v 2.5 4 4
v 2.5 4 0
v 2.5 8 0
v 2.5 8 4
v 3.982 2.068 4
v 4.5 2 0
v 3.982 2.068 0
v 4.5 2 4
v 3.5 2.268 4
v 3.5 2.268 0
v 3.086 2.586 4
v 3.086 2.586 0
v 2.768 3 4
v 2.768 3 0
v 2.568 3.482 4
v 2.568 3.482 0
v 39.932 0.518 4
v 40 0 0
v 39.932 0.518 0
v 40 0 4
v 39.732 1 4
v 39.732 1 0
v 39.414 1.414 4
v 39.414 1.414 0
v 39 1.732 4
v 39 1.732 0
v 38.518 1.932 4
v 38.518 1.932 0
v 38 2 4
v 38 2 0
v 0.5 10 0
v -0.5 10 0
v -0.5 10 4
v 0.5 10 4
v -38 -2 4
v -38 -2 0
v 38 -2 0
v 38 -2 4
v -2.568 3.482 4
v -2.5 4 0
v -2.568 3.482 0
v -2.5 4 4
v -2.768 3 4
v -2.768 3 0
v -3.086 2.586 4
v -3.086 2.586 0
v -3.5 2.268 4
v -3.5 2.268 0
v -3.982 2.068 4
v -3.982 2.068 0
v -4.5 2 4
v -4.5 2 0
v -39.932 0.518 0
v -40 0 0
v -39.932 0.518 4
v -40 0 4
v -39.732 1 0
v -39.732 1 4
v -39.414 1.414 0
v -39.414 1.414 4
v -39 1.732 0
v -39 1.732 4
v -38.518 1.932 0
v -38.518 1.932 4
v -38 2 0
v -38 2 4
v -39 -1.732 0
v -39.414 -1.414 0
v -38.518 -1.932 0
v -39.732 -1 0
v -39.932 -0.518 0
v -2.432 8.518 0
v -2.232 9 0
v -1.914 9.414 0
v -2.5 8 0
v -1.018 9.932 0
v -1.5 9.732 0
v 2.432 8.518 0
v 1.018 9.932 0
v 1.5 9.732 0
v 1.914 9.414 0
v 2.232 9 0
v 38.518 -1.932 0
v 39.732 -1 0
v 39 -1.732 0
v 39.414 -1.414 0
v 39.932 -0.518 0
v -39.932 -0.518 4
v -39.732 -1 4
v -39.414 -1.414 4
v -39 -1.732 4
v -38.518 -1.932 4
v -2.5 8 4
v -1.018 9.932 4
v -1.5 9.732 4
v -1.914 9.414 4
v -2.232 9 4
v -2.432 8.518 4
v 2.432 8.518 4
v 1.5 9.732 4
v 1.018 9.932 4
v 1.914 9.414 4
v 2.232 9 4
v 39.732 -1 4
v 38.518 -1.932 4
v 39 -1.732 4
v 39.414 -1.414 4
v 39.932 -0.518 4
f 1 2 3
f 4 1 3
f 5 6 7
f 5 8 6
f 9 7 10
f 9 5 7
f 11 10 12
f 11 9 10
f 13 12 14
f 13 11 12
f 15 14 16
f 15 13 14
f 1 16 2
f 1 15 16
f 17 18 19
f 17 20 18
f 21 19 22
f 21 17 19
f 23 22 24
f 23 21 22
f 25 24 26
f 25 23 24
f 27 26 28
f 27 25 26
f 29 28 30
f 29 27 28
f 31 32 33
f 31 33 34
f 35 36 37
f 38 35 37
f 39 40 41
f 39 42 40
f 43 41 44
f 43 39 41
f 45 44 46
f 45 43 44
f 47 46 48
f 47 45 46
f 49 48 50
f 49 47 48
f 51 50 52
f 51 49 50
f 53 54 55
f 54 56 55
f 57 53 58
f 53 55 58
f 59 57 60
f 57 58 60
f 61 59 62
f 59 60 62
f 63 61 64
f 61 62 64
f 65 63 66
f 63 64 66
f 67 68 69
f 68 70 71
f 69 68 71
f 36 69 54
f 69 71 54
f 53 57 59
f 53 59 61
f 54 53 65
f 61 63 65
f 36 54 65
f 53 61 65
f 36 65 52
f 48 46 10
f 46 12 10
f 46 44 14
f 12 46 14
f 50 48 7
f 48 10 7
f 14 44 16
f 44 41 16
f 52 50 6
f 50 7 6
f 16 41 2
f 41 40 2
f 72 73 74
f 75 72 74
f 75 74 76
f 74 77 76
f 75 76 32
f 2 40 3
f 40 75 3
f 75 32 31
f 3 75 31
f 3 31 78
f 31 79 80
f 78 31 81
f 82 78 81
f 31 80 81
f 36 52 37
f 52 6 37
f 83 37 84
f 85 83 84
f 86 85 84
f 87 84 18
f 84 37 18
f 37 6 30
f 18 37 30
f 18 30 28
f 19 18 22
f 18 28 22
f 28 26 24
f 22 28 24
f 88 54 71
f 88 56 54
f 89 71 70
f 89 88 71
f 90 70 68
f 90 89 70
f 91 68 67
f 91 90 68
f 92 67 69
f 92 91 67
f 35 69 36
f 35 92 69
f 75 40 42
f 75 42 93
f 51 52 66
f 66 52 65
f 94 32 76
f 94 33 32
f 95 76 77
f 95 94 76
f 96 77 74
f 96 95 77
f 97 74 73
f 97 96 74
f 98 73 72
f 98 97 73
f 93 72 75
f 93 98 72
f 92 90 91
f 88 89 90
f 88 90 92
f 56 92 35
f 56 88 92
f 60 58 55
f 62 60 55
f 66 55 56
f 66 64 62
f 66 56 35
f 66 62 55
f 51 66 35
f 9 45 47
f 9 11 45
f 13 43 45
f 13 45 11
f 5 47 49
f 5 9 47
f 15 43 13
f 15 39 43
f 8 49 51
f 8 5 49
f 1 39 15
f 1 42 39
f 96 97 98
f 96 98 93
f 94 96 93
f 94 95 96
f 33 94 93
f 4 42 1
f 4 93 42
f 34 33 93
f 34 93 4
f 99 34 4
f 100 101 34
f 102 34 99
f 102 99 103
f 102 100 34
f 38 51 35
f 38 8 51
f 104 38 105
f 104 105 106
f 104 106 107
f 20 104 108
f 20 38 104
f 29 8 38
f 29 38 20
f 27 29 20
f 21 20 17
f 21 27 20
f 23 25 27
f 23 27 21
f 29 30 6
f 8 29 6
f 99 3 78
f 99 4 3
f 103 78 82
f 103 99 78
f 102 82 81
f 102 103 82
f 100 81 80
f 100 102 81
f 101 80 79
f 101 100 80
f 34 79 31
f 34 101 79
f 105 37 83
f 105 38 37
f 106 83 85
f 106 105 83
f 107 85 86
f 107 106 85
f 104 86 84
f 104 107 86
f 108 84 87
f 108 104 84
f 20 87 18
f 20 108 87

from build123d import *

# Parameters (mm, degrees)
F0_W     = 5
F0_H     = 8
F1_DEPTH = 4
F2_R     = 1.99999


# Not quite as in the source:
# - a fillet or chamfer is up to 0.001 mm smaller than in the source, because OpenCascade refuses the exact size


with BuildPart() as f1:
    # F0 (on Top) → F1 (new body)
    with BuildSketch(Plane.XY):
        Polygon((-2.5, 2), (-40, 2), (-40, -2), (40, -2), (40, 2), (2.5, 2), align=None)
        with Locations((0, 6)):
            Rectangle(F0_W, F0_H)
    extrude(amount=F1_DEPTH)

    # F2 (radius 2 in the source; OpenCascade refuses exactly that, so slightly less here)
    f2_edges = [f1.edges().sort_by_distance(p)[0] for p in [
        (-40, -2, 2),
        (40, -2, 2),
        (40, 2, 2),
        (-40, 2, 2),
        (-2.5, 10, 2),
        (2.5, 10, 2),
        (-2.5, 2, 2),
        (2.5, 2, 2),
    ]]
    fillet(f2_edges, radius=F2_R)


solid = f1.part
